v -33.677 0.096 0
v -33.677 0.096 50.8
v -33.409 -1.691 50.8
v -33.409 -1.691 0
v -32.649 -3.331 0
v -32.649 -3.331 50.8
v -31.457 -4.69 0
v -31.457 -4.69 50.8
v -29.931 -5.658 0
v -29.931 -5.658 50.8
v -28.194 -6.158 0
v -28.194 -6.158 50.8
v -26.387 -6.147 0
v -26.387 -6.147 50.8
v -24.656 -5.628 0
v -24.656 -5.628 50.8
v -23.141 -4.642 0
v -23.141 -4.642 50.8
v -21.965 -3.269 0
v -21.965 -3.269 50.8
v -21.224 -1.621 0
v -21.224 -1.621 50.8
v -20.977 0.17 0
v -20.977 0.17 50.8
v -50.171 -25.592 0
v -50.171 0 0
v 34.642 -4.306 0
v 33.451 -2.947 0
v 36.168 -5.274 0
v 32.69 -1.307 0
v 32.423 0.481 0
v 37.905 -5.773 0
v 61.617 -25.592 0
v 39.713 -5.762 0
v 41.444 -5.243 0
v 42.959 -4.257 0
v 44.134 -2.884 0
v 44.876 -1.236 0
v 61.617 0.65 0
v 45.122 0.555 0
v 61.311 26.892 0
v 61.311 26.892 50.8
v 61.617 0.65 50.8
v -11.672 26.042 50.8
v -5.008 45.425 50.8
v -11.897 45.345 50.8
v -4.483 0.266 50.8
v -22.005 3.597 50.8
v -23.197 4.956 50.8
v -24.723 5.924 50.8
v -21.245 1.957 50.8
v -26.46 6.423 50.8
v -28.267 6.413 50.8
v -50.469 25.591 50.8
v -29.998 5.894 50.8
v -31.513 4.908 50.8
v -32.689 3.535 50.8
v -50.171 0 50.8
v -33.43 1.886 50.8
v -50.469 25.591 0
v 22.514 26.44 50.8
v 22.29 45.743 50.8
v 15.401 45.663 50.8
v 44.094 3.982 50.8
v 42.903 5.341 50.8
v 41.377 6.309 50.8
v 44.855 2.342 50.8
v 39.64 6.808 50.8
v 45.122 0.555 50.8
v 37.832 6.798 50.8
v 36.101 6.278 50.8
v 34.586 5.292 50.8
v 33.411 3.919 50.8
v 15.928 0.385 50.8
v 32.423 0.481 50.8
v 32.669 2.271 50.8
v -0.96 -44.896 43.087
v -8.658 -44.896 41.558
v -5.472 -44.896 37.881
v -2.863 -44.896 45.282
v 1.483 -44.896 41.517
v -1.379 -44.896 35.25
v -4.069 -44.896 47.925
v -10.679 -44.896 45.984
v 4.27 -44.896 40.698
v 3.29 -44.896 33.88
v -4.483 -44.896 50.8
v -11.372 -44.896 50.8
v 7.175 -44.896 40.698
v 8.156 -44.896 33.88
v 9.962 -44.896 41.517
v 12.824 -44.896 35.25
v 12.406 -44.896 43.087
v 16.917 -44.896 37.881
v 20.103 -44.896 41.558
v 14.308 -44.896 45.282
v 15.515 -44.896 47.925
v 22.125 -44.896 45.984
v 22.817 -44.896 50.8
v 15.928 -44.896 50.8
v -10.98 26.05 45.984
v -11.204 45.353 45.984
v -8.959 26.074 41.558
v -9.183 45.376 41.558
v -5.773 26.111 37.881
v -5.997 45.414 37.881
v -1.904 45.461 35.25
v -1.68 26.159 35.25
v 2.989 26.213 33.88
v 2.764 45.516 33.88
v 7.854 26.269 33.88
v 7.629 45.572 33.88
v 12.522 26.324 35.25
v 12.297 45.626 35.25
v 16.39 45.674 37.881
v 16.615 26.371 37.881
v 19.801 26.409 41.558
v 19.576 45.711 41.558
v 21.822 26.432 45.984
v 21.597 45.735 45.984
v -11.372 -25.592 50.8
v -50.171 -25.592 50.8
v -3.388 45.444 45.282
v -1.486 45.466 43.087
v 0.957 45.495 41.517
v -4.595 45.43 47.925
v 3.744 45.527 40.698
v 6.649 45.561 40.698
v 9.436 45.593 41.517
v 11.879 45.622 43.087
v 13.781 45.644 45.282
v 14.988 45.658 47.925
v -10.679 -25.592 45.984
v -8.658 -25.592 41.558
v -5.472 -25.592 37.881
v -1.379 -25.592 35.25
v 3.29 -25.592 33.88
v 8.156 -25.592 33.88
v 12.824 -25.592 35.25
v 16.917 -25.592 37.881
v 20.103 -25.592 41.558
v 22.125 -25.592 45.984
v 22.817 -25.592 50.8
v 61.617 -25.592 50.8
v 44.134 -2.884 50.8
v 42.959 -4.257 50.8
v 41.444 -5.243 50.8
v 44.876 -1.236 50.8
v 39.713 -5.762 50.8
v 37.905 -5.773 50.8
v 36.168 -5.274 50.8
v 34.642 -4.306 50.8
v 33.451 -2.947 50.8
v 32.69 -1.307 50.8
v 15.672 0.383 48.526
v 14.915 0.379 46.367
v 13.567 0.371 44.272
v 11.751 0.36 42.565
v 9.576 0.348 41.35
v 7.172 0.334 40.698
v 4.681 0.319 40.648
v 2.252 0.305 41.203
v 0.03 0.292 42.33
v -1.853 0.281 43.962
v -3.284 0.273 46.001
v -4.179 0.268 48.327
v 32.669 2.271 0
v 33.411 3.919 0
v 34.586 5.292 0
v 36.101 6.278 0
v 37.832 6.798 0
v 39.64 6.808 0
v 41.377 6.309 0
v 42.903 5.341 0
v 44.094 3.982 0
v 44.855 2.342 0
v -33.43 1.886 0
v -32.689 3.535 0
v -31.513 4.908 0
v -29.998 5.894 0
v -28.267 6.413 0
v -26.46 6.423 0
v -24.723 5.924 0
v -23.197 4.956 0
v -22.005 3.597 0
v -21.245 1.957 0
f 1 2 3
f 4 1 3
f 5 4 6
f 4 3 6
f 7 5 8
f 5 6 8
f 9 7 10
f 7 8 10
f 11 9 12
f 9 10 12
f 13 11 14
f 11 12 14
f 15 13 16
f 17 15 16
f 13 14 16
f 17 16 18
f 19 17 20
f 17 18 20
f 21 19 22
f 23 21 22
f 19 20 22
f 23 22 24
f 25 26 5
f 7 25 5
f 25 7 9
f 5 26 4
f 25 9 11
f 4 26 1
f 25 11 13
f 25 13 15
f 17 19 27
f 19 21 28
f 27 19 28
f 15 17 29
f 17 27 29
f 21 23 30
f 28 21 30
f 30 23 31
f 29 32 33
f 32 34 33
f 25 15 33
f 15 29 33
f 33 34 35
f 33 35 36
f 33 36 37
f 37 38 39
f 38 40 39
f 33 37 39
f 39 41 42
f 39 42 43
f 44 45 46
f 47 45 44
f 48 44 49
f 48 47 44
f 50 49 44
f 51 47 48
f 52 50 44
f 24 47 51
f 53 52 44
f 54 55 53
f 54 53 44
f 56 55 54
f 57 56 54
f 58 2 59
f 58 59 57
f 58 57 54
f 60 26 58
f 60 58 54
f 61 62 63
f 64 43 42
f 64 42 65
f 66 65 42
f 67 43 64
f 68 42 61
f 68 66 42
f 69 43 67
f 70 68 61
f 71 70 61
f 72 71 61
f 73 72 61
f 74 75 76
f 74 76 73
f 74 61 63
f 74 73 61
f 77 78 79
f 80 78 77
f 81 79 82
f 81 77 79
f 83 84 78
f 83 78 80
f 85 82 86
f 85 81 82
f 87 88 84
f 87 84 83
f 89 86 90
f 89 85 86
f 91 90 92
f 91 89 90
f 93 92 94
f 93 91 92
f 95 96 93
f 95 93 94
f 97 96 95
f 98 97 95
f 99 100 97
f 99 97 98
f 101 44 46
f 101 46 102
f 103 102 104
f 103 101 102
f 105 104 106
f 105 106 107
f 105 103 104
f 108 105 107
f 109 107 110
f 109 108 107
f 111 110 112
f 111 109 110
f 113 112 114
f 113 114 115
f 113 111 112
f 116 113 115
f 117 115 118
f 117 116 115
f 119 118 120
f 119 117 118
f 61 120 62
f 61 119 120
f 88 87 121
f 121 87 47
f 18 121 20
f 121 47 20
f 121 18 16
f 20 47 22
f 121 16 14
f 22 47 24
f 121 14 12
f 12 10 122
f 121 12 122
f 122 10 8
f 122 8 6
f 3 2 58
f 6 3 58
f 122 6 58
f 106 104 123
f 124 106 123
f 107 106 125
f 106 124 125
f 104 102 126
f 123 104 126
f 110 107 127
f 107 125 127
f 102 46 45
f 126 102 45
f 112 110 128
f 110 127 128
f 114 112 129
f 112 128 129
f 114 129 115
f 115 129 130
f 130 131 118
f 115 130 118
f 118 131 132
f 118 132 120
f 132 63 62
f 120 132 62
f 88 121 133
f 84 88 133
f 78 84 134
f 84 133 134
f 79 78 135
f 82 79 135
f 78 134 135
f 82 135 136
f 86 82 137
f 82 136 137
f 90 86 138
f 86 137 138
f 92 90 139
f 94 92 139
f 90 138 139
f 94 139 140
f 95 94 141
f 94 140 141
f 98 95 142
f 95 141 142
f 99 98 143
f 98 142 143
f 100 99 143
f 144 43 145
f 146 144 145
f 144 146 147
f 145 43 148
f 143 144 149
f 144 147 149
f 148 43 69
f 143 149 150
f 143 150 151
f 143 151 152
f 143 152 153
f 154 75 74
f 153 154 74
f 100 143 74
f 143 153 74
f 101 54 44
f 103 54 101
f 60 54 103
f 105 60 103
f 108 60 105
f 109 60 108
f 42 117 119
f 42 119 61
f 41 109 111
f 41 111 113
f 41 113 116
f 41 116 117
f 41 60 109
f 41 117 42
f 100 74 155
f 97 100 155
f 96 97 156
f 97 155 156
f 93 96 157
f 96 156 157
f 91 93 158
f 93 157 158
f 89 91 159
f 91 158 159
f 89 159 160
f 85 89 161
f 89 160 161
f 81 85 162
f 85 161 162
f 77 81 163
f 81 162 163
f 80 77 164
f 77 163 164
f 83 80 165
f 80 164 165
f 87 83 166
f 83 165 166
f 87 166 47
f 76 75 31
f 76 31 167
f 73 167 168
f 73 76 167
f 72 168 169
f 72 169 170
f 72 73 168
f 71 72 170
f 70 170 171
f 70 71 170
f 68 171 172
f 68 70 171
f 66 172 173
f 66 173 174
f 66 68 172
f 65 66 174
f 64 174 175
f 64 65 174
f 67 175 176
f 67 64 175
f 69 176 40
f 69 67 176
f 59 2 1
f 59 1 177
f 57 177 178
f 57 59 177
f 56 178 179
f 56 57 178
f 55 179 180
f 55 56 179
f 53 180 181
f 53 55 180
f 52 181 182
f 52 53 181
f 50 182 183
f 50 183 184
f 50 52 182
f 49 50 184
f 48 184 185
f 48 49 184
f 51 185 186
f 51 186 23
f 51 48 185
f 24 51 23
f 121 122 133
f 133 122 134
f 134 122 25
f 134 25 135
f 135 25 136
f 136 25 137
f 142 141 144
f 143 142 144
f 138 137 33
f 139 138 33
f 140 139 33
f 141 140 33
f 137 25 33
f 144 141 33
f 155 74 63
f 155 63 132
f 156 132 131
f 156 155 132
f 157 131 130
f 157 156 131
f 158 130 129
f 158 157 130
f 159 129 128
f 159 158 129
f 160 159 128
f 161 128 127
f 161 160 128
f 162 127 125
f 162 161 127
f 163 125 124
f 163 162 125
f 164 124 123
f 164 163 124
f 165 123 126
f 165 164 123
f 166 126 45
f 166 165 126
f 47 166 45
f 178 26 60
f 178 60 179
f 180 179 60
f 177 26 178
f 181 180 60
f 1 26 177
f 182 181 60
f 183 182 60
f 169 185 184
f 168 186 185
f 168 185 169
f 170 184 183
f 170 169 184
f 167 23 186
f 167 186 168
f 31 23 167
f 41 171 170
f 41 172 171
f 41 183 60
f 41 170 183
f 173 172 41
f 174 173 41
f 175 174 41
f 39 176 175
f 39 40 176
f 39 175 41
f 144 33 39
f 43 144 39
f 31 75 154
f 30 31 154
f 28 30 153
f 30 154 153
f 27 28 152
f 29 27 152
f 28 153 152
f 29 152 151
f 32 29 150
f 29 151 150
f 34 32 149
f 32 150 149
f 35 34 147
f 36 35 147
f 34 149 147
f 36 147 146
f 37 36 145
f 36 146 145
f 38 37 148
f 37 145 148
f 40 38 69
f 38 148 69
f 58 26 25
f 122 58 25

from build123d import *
from build123d import SkipClean  # not in build123d's __all__

# Parameters (mm, degrees)
F1_DEPTH = 50.8
F3_DEPTH = 33.782
F4_DEPTH = 19.304
F7_DEPTH = 62.738
F8_DEPTH = 50.8


with BuildPart() as f1:
    # F0 (on Top) → F1 (new body)
    with BuildSketch(Plane.XY):
        Polygon((-50.1712188125, 0), (-50.1712188125, -25.5924221128), (61.6167448461, -25.5924221128), (61.6167448461, 0.6504831836), align=None)
    extrude(amount=F1_DEPTH)

    # F2 (on face) → F3 (cut)
    with BuildSketch(Plane.XZ.offset(25.5924221128)):
        with BuildLine():
            Line((15.9283644421, 50.8), (-4.4828384085, 50.8))
            ThreePointArc((-4.4828384085, 50.8), (5.7227630168, 40.5943985747), (15.9283644421, 50.8))
        make_face()
    extrude(amount=-F3_DEPTH, mode=Mode.SUBTRACT)

    # F2 (on face) → F4 (join)
    with BuildSketch(Plane.XZ.offset(25.5924221128)):
        with BuildLine():
            Line((-4.4828384085, 50.8), (-11.371643244, 50.8))
            ThreePointArc((-11.371643244, 50.8), (5.7227630168, 33.7055937392), (22.8171692776, 50.8))
            Line((22.8171692776, 50.8), (15.9283644421, 50.8))
            ThreePointArc((15.9283644421, 50.8), (5.7227630168, 40.5943985747), (-4.4828384085, 50.8))
        make_face()
    extrude(amount=F4_DEPTH)

    # F5 (on face) → F7 (cut)
    with BuildSketch(Plane.XY.offset(50.8)):
        with BuildLine():
            Line((-20.977136112, 0.1698775005), (-33.6769211089, 0.0959786987))
            ThreePointArc((-33.6769211089, 0.0959786987), (-27.2900792096, -6.2169643988), (-20.977136112, 0.1698775005))
        make_face()
    extrude(amount=-F7_DEPTH, mode=Mode.SUBTRACT)

    # F6 (on face) → F8 (cut)
    with BuildSketch(Plane.XY.offset(50.8)):
        with BuildLine():
            Line((45.1224471426, 0.5545044849), (32.4226621457, 0.480605683))
            ThreePointArc((32.4226621457, 0.480605683), (38.809504045, -5.8323374145), (45.1224471426, 0.5545044849))
        make_face()
    extrude(amount=-F8_DEPTH, mode=Mode.SUBTRACT)

    # F9: F1 across face


with BuildPart() as f1_1:
    add(f1.part, clean=False)
    with SkipClean():  # cleaning this boolean's faces spoils the solid; the shape is the same uncleaned
        add(f1.part.mirror(Plane(origin=(5.7227630168, 0.3252415918, 24.0477864572), x_dir=(-0.9999830706, -0.0058188033, 0), z_dir=(-0.0058188033, 0.9999830706, 0))), clean=False)


solid = f1_1.part
